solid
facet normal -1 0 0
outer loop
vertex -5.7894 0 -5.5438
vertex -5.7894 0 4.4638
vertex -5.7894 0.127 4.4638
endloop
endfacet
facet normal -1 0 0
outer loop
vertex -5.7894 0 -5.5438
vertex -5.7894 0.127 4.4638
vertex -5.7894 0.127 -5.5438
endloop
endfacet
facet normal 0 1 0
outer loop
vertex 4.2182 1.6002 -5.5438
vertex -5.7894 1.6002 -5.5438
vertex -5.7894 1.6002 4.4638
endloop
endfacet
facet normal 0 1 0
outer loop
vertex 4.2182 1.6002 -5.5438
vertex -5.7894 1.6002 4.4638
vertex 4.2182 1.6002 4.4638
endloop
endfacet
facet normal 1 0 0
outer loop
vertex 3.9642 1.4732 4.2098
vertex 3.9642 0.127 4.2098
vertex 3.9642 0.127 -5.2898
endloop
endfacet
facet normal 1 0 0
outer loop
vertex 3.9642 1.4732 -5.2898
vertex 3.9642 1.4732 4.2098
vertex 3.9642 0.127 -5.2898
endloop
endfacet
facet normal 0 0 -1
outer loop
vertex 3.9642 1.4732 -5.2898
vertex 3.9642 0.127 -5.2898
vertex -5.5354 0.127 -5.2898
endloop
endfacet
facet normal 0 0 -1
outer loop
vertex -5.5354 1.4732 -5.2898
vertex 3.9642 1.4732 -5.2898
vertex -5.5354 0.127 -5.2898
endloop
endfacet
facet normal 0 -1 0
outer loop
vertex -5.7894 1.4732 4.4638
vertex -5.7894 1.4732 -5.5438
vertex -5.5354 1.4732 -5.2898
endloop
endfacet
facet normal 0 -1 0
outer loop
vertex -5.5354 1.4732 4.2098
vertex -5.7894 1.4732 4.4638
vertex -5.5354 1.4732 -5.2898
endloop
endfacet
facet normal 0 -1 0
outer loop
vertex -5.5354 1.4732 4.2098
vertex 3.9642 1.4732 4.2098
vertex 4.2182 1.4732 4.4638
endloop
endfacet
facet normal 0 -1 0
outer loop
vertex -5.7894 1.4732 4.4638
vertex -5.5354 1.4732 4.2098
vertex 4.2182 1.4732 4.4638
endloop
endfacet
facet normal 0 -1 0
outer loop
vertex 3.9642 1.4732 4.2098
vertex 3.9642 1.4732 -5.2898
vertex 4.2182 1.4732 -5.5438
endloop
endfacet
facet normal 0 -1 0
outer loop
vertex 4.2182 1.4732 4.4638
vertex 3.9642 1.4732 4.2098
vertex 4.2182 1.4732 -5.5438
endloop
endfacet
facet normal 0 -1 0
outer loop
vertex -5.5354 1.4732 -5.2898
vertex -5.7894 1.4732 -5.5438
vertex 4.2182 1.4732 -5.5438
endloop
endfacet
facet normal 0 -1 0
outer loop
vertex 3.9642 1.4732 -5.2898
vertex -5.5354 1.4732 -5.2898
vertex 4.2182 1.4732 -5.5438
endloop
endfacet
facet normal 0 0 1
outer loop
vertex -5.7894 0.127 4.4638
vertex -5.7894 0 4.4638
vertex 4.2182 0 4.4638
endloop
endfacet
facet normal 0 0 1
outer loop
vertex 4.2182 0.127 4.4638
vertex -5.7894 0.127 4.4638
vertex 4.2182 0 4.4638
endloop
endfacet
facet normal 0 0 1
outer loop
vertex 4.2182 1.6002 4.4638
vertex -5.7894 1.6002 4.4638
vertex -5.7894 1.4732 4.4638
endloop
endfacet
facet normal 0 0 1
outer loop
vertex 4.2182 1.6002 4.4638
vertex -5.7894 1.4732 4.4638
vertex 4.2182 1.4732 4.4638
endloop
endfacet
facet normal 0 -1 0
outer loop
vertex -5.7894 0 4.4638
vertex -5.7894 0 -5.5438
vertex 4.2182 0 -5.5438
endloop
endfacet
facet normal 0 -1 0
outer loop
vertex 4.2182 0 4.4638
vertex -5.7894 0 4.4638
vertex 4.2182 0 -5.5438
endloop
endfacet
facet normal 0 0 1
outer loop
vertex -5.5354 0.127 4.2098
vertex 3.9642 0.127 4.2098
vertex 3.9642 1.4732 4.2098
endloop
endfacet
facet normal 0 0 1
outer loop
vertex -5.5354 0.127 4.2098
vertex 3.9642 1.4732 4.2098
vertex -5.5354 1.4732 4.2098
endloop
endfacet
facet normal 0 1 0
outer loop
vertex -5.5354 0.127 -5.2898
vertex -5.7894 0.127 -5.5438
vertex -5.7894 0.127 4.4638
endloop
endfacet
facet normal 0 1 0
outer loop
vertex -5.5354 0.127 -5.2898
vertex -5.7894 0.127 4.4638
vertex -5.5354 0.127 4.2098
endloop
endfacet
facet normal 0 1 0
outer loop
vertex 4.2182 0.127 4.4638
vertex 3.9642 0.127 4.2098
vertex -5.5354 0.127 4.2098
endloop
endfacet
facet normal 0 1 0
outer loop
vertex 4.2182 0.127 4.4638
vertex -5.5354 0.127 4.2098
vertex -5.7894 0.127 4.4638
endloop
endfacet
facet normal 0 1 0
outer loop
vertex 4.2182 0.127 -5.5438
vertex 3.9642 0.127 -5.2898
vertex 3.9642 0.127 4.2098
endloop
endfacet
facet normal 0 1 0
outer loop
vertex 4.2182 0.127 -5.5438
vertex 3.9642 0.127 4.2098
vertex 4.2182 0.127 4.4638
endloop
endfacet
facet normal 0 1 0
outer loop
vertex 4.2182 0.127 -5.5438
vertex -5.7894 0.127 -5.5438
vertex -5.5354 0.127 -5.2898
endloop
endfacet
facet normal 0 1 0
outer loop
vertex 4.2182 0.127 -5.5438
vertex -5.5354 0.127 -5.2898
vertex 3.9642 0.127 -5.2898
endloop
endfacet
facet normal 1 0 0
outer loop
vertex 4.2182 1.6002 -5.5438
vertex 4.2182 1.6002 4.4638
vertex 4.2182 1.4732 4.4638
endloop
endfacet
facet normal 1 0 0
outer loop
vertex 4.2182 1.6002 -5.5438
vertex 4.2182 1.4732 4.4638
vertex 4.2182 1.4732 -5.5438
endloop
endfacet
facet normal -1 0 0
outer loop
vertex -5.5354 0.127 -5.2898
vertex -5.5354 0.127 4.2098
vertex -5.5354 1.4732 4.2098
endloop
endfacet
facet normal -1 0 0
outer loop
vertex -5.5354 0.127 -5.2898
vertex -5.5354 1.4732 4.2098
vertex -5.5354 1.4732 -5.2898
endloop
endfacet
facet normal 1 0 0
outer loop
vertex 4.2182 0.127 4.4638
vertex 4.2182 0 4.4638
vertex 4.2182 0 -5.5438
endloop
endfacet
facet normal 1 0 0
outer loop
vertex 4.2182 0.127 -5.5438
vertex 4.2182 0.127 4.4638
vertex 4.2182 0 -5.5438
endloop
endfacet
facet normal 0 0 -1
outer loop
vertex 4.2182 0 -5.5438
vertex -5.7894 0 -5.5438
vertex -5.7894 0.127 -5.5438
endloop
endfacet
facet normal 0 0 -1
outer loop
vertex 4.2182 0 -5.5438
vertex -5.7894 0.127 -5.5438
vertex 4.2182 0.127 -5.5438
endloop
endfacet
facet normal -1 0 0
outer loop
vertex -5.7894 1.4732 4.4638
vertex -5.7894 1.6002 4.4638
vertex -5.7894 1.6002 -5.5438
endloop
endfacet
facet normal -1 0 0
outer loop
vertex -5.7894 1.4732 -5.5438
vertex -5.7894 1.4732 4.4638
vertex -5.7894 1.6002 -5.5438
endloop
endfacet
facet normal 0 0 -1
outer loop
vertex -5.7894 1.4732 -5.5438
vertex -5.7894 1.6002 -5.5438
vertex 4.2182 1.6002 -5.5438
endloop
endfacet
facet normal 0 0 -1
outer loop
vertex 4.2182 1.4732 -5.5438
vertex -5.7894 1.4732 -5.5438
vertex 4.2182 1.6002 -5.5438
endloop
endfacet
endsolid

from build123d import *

# Parameters (mm, degrees)
SKETCH1_W           = 10.0076
SKETCH1_H           = 10.0076
SKETCH1_W_2         = 9.4996
SKETCH1_H_2         = 9.4996
BOSS_EXTRUDE1_DEPTH = 0.127
SKETCH2_W           = 9.4996
SKETCH2_H           = 9.4996
BOSS_EXTRUDE2_DEPTH = 1.6002
SKETCH3_W           = 10.0076
SKETCH3_H           = 10.0076
SKETCH3_W_2         = 9.4996
SKETCH3_H_2         = 9.4996
BOSS_EXTRUDE3_DEPTH = 0.127


with BuildPart() as part:
    # Sketch1 → Boss-Extrude1 (new body)
    with BuildSketch(Plane(origin=(0, 0, 0), x_dir=(1, 0, 0), z_dir=(0, 1, 0))):
        with Locations((-0.7855503, 0.539979905)):
            Rectangle(SKETCH1_W, SKETCH1_H)
        with Locations((-0.7855503, 0.539979905)):
            Rectangle(SKETCH1_W_2, SKETCH1_H_2, mode=Mode.SUBTRACT)
    extrude(amount=BOSS_EXTRUDE1_DEPTH)

    # Sketch2 → Boss-Extrude2 (add)
    with BuildSketch(Plane(origin=(0, 0, 0), x_dir=(-1, 0, 0), z_dir=(0, -1, 0))):
        with Locations((0.7855503, 0.539979905)):
            Rectangle(SKETCH2_W, SKETCH2_H)
    extrude(amount=-BOSS_EXTRUDE2_DEPTH)

    # Sketch3 → Boss-Extrude3 (add)
    with BuildSketch(Plane(origin=(0, 1.6002, 0), x_dir=(1, 0, 0), z_dir=(0, 1, 0))):
        with Locations((-0.7855503, 0.539979905)):
            Rectangle(SKETCH3_W, SKETCH3_H)
        with Locations((-0.7855503, 0.539979905)):
            Rectangle(SKETCH3_W_2, SKETCH3_H_2, mode=Mode.SUBTRACT)
    extrude(amount=-BOSS_EXTRUDE3_DEPTH)


solid = part.part
